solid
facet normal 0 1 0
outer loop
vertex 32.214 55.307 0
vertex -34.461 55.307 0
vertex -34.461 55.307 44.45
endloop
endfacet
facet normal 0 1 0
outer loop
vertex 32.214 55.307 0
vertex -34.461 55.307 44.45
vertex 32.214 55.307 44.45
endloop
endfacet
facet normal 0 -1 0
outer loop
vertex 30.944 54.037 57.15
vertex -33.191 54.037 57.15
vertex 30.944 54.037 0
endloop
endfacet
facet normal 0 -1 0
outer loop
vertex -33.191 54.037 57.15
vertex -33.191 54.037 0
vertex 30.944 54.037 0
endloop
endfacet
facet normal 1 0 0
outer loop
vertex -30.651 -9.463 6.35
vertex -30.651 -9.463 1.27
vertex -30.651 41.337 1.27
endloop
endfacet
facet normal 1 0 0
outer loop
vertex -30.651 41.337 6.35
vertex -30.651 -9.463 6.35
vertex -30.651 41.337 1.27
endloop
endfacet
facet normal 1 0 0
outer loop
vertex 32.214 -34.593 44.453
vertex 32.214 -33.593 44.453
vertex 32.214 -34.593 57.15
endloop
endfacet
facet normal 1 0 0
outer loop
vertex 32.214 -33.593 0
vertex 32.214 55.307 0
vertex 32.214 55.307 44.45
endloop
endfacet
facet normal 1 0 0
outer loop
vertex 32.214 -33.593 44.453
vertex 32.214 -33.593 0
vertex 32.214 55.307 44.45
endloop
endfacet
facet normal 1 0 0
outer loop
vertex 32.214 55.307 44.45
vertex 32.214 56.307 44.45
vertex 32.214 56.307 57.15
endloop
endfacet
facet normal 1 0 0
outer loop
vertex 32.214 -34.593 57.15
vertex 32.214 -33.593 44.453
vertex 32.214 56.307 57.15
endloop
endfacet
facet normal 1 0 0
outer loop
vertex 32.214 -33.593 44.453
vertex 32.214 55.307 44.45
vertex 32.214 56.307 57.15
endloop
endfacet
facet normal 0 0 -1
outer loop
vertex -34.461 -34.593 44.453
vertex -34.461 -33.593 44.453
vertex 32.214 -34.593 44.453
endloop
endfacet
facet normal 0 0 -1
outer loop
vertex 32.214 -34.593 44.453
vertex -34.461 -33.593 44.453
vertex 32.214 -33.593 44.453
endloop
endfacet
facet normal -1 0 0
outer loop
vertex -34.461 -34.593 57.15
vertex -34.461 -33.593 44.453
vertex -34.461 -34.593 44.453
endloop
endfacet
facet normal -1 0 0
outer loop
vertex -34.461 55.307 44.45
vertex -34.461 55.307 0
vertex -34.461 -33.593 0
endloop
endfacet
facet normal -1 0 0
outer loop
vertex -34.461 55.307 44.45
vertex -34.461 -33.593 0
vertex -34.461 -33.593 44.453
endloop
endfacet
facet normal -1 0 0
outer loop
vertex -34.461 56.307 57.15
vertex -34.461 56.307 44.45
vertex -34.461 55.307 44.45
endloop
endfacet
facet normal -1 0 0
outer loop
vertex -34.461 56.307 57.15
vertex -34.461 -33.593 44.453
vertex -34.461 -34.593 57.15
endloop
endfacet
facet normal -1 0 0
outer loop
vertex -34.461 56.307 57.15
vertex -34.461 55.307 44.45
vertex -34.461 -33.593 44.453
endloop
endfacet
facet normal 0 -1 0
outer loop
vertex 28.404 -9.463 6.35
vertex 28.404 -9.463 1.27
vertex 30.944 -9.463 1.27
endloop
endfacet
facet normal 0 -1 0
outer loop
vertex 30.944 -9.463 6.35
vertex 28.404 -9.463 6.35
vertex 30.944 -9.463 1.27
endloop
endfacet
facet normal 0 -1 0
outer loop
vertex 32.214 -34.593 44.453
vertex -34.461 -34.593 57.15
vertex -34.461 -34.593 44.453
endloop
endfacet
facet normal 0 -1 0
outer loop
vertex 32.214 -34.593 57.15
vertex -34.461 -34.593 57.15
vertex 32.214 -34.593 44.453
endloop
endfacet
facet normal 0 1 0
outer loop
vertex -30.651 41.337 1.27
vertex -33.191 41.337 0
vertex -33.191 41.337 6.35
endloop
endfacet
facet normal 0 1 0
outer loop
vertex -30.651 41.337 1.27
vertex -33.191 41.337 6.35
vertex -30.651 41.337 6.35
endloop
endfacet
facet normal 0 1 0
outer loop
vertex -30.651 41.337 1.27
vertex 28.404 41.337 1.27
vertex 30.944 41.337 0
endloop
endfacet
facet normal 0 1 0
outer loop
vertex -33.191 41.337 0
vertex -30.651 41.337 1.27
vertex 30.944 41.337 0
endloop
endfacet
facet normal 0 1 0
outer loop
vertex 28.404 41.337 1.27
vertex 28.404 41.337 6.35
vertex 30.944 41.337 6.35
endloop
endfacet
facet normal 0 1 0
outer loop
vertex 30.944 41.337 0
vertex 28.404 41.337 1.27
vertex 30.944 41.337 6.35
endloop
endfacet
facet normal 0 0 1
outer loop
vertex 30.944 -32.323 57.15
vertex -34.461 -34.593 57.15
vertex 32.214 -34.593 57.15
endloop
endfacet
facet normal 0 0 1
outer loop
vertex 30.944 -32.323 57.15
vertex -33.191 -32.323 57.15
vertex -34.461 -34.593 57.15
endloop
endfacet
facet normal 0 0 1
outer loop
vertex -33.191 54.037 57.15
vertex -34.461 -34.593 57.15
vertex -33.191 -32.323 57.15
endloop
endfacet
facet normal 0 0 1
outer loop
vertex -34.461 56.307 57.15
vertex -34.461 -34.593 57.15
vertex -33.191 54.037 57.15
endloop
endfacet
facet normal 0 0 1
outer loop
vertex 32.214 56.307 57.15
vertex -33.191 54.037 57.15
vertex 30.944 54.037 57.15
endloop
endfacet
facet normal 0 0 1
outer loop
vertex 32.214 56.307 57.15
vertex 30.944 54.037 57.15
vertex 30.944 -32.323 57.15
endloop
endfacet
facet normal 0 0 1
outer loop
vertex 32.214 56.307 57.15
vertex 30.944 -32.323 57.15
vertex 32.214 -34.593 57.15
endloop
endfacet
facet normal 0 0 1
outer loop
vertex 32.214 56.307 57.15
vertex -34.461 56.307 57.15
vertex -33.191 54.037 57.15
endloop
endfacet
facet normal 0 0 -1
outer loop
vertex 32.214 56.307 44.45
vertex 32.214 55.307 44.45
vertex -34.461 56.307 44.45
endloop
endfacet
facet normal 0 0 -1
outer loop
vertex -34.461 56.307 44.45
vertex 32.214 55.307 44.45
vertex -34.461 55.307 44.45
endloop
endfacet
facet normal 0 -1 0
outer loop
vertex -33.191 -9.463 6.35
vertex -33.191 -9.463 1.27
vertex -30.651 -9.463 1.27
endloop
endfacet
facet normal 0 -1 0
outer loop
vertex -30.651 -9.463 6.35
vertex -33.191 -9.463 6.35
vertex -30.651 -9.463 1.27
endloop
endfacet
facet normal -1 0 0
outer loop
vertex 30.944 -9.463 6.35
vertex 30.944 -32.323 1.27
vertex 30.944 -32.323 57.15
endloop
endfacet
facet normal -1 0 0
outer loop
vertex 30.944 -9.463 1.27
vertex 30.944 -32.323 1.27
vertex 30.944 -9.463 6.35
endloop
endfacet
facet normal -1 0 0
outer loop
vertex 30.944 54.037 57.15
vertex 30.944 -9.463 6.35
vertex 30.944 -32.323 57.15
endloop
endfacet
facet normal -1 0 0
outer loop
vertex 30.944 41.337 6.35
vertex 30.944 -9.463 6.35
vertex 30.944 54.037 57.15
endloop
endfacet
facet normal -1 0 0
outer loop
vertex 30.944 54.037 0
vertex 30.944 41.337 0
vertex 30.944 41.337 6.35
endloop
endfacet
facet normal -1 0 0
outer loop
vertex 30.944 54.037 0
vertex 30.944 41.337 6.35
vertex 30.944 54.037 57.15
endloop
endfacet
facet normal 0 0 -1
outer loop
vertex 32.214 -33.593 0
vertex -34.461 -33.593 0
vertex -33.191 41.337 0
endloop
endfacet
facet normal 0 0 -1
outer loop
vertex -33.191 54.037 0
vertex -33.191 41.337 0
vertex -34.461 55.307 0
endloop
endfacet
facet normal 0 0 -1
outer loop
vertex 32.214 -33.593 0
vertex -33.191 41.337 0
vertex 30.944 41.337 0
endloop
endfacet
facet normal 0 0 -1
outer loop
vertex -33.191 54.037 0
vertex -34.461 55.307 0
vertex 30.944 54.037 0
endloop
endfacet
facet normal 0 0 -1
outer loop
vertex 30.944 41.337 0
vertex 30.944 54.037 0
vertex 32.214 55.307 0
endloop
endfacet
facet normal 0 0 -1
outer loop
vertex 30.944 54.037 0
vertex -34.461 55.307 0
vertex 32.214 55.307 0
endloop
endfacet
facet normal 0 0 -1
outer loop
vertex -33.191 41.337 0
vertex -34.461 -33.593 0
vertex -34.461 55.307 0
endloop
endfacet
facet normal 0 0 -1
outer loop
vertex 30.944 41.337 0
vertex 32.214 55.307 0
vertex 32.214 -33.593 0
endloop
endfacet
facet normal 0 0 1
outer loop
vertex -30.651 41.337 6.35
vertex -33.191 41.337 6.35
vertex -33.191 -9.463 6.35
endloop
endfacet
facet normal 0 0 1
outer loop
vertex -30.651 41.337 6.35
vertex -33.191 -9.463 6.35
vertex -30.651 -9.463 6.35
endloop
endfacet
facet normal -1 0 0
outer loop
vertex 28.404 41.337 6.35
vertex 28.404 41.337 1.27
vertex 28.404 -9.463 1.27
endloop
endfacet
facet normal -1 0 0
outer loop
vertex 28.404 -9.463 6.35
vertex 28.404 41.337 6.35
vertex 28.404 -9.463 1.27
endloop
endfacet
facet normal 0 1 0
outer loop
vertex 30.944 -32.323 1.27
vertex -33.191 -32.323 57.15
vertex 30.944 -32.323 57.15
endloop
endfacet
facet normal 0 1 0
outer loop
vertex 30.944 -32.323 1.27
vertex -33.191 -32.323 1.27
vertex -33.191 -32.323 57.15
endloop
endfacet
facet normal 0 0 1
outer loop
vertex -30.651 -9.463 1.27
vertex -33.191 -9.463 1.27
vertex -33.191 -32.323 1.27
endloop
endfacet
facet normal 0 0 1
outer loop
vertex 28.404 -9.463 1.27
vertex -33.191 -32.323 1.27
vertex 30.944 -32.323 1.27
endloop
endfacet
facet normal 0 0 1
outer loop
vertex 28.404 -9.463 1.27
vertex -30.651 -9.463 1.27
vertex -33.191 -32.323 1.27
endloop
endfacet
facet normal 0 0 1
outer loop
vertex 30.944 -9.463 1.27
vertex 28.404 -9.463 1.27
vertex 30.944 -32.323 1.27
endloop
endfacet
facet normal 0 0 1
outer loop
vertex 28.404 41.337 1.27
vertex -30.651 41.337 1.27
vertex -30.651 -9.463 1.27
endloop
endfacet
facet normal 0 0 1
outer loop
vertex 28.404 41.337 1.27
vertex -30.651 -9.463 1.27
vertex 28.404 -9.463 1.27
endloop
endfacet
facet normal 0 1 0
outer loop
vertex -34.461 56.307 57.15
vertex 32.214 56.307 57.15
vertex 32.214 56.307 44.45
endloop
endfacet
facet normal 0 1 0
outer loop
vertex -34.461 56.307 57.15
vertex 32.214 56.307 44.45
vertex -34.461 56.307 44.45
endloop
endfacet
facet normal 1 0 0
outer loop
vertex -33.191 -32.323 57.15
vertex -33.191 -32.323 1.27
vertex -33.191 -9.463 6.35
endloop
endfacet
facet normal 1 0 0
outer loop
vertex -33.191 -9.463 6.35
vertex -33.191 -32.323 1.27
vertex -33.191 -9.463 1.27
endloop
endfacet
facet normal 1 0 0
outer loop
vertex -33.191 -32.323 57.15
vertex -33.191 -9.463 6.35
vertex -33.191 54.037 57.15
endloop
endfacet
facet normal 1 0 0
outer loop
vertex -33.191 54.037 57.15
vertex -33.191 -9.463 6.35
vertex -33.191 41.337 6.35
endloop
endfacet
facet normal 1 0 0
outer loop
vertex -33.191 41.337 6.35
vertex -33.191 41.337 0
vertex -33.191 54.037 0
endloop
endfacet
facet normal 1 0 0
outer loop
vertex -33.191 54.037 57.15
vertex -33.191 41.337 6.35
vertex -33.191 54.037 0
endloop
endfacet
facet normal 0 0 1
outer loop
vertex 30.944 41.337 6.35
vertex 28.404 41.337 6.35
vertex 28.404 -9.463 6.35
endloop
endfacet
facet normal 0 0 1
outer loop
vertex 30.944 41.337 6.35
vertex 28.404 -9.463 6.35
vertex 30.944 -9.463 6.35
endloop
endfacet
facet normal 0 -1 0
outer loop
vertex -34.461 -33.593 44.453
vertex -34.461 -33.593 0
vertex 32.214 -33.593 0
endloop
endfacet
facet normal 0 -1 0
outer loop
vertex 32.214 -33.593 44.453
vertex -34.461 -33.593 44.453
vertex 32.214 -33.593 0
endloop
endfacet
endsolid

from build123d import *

# Parameters (mm, degrees)
F0_W     = 66.675
F0_H     = 88.9
F1_DEPTH = 57.15
F2_T     = -1.27
F4_DEPTH = 5.08
F5_W     = 66.675
F5_H     = 12.7
F6_DEPTH = 1
F7_W     = 66.675
F7_H     = 12.6965791702
F8_DEPTH = 1
F9_DEPTH = 25.4


with BuildPart() as f1:
    # F0 (on Top) → F1 (new body)
    with BuildSketch(Plane.XY):
        with Locations((-1.1231470853, 10.8568438743)):
            Rectangle(F0_W, F0_H)
    extrude(amount=F1_DEPTH)

    # F2
    f2_openings = [f1.faces().sort_by_distance(p)[0] for p in [
        (-1.123147, 10.856844, 57.15),
    ]]
    offset(amount=F2_T, openings=f2_openings)

    # F3 (on face) → F4 (join)
    with BuildSketch(Plane.XY.offset(1.27)):
        Polygon((30.9443529147, 41.3368438743), (28.4043529147, 41.3368438743), (28.4043529147, -0.1921561257), (28.4043529147, -3.3671561257), (28.4043529147, -9.4631561257), (30.9443529147, -9.4631561257), align=None)
        Polygon((-30.6506470853, 41.3368438743), (-33.1906470853, 41.3368438743), (-33.1906470853, -9.4631561257), (-30.6506470853, -9.4631561257), (-30.6506470853, -3.3671561257), (-30.6506470853, -0.1921561257), align=None)
    extrude(amount=F4_DEPTH)

    # F5 (on face) → F6 (join)
    with BuildSketch(Plane(origin=(0, 55.3068438743, 0), x_dir=(-1, 0, 0), z_dir=(0, 1, 0))):
        with Locations((1.1231470853, 50.8)):
            Rectangle(F5_W, F5_H)
    extrude(amount=F6_DEPTH)

    # F7 (on face) → F8 (join)
    with BuildSketch(Plane.XZ.offset(33.5931561257)):
        with Locations((-1.1231470853, 50.8017104149)):
            Rectangle(F7_W, F7_H)
    extrude(amount=F8_DEPTH)

    # F3 (on face) → F9 (cut)
    with BuildSketch(Plane.XY.offset(1.27)):
        Polygon((-33.1906470853, 54.0368438743), (-33.1906470853, 41.3368438743), (-30.6506470853, 41.3368438743), (28.4043529147, 41.3368438743), (30.9443529147, 41.3368438743), (30.9443529147, 54.0368438743), align=None)
    extrude(amount=-F9_DEPTH, mode=Mode.SUBTRACT)


solid = f1.part
